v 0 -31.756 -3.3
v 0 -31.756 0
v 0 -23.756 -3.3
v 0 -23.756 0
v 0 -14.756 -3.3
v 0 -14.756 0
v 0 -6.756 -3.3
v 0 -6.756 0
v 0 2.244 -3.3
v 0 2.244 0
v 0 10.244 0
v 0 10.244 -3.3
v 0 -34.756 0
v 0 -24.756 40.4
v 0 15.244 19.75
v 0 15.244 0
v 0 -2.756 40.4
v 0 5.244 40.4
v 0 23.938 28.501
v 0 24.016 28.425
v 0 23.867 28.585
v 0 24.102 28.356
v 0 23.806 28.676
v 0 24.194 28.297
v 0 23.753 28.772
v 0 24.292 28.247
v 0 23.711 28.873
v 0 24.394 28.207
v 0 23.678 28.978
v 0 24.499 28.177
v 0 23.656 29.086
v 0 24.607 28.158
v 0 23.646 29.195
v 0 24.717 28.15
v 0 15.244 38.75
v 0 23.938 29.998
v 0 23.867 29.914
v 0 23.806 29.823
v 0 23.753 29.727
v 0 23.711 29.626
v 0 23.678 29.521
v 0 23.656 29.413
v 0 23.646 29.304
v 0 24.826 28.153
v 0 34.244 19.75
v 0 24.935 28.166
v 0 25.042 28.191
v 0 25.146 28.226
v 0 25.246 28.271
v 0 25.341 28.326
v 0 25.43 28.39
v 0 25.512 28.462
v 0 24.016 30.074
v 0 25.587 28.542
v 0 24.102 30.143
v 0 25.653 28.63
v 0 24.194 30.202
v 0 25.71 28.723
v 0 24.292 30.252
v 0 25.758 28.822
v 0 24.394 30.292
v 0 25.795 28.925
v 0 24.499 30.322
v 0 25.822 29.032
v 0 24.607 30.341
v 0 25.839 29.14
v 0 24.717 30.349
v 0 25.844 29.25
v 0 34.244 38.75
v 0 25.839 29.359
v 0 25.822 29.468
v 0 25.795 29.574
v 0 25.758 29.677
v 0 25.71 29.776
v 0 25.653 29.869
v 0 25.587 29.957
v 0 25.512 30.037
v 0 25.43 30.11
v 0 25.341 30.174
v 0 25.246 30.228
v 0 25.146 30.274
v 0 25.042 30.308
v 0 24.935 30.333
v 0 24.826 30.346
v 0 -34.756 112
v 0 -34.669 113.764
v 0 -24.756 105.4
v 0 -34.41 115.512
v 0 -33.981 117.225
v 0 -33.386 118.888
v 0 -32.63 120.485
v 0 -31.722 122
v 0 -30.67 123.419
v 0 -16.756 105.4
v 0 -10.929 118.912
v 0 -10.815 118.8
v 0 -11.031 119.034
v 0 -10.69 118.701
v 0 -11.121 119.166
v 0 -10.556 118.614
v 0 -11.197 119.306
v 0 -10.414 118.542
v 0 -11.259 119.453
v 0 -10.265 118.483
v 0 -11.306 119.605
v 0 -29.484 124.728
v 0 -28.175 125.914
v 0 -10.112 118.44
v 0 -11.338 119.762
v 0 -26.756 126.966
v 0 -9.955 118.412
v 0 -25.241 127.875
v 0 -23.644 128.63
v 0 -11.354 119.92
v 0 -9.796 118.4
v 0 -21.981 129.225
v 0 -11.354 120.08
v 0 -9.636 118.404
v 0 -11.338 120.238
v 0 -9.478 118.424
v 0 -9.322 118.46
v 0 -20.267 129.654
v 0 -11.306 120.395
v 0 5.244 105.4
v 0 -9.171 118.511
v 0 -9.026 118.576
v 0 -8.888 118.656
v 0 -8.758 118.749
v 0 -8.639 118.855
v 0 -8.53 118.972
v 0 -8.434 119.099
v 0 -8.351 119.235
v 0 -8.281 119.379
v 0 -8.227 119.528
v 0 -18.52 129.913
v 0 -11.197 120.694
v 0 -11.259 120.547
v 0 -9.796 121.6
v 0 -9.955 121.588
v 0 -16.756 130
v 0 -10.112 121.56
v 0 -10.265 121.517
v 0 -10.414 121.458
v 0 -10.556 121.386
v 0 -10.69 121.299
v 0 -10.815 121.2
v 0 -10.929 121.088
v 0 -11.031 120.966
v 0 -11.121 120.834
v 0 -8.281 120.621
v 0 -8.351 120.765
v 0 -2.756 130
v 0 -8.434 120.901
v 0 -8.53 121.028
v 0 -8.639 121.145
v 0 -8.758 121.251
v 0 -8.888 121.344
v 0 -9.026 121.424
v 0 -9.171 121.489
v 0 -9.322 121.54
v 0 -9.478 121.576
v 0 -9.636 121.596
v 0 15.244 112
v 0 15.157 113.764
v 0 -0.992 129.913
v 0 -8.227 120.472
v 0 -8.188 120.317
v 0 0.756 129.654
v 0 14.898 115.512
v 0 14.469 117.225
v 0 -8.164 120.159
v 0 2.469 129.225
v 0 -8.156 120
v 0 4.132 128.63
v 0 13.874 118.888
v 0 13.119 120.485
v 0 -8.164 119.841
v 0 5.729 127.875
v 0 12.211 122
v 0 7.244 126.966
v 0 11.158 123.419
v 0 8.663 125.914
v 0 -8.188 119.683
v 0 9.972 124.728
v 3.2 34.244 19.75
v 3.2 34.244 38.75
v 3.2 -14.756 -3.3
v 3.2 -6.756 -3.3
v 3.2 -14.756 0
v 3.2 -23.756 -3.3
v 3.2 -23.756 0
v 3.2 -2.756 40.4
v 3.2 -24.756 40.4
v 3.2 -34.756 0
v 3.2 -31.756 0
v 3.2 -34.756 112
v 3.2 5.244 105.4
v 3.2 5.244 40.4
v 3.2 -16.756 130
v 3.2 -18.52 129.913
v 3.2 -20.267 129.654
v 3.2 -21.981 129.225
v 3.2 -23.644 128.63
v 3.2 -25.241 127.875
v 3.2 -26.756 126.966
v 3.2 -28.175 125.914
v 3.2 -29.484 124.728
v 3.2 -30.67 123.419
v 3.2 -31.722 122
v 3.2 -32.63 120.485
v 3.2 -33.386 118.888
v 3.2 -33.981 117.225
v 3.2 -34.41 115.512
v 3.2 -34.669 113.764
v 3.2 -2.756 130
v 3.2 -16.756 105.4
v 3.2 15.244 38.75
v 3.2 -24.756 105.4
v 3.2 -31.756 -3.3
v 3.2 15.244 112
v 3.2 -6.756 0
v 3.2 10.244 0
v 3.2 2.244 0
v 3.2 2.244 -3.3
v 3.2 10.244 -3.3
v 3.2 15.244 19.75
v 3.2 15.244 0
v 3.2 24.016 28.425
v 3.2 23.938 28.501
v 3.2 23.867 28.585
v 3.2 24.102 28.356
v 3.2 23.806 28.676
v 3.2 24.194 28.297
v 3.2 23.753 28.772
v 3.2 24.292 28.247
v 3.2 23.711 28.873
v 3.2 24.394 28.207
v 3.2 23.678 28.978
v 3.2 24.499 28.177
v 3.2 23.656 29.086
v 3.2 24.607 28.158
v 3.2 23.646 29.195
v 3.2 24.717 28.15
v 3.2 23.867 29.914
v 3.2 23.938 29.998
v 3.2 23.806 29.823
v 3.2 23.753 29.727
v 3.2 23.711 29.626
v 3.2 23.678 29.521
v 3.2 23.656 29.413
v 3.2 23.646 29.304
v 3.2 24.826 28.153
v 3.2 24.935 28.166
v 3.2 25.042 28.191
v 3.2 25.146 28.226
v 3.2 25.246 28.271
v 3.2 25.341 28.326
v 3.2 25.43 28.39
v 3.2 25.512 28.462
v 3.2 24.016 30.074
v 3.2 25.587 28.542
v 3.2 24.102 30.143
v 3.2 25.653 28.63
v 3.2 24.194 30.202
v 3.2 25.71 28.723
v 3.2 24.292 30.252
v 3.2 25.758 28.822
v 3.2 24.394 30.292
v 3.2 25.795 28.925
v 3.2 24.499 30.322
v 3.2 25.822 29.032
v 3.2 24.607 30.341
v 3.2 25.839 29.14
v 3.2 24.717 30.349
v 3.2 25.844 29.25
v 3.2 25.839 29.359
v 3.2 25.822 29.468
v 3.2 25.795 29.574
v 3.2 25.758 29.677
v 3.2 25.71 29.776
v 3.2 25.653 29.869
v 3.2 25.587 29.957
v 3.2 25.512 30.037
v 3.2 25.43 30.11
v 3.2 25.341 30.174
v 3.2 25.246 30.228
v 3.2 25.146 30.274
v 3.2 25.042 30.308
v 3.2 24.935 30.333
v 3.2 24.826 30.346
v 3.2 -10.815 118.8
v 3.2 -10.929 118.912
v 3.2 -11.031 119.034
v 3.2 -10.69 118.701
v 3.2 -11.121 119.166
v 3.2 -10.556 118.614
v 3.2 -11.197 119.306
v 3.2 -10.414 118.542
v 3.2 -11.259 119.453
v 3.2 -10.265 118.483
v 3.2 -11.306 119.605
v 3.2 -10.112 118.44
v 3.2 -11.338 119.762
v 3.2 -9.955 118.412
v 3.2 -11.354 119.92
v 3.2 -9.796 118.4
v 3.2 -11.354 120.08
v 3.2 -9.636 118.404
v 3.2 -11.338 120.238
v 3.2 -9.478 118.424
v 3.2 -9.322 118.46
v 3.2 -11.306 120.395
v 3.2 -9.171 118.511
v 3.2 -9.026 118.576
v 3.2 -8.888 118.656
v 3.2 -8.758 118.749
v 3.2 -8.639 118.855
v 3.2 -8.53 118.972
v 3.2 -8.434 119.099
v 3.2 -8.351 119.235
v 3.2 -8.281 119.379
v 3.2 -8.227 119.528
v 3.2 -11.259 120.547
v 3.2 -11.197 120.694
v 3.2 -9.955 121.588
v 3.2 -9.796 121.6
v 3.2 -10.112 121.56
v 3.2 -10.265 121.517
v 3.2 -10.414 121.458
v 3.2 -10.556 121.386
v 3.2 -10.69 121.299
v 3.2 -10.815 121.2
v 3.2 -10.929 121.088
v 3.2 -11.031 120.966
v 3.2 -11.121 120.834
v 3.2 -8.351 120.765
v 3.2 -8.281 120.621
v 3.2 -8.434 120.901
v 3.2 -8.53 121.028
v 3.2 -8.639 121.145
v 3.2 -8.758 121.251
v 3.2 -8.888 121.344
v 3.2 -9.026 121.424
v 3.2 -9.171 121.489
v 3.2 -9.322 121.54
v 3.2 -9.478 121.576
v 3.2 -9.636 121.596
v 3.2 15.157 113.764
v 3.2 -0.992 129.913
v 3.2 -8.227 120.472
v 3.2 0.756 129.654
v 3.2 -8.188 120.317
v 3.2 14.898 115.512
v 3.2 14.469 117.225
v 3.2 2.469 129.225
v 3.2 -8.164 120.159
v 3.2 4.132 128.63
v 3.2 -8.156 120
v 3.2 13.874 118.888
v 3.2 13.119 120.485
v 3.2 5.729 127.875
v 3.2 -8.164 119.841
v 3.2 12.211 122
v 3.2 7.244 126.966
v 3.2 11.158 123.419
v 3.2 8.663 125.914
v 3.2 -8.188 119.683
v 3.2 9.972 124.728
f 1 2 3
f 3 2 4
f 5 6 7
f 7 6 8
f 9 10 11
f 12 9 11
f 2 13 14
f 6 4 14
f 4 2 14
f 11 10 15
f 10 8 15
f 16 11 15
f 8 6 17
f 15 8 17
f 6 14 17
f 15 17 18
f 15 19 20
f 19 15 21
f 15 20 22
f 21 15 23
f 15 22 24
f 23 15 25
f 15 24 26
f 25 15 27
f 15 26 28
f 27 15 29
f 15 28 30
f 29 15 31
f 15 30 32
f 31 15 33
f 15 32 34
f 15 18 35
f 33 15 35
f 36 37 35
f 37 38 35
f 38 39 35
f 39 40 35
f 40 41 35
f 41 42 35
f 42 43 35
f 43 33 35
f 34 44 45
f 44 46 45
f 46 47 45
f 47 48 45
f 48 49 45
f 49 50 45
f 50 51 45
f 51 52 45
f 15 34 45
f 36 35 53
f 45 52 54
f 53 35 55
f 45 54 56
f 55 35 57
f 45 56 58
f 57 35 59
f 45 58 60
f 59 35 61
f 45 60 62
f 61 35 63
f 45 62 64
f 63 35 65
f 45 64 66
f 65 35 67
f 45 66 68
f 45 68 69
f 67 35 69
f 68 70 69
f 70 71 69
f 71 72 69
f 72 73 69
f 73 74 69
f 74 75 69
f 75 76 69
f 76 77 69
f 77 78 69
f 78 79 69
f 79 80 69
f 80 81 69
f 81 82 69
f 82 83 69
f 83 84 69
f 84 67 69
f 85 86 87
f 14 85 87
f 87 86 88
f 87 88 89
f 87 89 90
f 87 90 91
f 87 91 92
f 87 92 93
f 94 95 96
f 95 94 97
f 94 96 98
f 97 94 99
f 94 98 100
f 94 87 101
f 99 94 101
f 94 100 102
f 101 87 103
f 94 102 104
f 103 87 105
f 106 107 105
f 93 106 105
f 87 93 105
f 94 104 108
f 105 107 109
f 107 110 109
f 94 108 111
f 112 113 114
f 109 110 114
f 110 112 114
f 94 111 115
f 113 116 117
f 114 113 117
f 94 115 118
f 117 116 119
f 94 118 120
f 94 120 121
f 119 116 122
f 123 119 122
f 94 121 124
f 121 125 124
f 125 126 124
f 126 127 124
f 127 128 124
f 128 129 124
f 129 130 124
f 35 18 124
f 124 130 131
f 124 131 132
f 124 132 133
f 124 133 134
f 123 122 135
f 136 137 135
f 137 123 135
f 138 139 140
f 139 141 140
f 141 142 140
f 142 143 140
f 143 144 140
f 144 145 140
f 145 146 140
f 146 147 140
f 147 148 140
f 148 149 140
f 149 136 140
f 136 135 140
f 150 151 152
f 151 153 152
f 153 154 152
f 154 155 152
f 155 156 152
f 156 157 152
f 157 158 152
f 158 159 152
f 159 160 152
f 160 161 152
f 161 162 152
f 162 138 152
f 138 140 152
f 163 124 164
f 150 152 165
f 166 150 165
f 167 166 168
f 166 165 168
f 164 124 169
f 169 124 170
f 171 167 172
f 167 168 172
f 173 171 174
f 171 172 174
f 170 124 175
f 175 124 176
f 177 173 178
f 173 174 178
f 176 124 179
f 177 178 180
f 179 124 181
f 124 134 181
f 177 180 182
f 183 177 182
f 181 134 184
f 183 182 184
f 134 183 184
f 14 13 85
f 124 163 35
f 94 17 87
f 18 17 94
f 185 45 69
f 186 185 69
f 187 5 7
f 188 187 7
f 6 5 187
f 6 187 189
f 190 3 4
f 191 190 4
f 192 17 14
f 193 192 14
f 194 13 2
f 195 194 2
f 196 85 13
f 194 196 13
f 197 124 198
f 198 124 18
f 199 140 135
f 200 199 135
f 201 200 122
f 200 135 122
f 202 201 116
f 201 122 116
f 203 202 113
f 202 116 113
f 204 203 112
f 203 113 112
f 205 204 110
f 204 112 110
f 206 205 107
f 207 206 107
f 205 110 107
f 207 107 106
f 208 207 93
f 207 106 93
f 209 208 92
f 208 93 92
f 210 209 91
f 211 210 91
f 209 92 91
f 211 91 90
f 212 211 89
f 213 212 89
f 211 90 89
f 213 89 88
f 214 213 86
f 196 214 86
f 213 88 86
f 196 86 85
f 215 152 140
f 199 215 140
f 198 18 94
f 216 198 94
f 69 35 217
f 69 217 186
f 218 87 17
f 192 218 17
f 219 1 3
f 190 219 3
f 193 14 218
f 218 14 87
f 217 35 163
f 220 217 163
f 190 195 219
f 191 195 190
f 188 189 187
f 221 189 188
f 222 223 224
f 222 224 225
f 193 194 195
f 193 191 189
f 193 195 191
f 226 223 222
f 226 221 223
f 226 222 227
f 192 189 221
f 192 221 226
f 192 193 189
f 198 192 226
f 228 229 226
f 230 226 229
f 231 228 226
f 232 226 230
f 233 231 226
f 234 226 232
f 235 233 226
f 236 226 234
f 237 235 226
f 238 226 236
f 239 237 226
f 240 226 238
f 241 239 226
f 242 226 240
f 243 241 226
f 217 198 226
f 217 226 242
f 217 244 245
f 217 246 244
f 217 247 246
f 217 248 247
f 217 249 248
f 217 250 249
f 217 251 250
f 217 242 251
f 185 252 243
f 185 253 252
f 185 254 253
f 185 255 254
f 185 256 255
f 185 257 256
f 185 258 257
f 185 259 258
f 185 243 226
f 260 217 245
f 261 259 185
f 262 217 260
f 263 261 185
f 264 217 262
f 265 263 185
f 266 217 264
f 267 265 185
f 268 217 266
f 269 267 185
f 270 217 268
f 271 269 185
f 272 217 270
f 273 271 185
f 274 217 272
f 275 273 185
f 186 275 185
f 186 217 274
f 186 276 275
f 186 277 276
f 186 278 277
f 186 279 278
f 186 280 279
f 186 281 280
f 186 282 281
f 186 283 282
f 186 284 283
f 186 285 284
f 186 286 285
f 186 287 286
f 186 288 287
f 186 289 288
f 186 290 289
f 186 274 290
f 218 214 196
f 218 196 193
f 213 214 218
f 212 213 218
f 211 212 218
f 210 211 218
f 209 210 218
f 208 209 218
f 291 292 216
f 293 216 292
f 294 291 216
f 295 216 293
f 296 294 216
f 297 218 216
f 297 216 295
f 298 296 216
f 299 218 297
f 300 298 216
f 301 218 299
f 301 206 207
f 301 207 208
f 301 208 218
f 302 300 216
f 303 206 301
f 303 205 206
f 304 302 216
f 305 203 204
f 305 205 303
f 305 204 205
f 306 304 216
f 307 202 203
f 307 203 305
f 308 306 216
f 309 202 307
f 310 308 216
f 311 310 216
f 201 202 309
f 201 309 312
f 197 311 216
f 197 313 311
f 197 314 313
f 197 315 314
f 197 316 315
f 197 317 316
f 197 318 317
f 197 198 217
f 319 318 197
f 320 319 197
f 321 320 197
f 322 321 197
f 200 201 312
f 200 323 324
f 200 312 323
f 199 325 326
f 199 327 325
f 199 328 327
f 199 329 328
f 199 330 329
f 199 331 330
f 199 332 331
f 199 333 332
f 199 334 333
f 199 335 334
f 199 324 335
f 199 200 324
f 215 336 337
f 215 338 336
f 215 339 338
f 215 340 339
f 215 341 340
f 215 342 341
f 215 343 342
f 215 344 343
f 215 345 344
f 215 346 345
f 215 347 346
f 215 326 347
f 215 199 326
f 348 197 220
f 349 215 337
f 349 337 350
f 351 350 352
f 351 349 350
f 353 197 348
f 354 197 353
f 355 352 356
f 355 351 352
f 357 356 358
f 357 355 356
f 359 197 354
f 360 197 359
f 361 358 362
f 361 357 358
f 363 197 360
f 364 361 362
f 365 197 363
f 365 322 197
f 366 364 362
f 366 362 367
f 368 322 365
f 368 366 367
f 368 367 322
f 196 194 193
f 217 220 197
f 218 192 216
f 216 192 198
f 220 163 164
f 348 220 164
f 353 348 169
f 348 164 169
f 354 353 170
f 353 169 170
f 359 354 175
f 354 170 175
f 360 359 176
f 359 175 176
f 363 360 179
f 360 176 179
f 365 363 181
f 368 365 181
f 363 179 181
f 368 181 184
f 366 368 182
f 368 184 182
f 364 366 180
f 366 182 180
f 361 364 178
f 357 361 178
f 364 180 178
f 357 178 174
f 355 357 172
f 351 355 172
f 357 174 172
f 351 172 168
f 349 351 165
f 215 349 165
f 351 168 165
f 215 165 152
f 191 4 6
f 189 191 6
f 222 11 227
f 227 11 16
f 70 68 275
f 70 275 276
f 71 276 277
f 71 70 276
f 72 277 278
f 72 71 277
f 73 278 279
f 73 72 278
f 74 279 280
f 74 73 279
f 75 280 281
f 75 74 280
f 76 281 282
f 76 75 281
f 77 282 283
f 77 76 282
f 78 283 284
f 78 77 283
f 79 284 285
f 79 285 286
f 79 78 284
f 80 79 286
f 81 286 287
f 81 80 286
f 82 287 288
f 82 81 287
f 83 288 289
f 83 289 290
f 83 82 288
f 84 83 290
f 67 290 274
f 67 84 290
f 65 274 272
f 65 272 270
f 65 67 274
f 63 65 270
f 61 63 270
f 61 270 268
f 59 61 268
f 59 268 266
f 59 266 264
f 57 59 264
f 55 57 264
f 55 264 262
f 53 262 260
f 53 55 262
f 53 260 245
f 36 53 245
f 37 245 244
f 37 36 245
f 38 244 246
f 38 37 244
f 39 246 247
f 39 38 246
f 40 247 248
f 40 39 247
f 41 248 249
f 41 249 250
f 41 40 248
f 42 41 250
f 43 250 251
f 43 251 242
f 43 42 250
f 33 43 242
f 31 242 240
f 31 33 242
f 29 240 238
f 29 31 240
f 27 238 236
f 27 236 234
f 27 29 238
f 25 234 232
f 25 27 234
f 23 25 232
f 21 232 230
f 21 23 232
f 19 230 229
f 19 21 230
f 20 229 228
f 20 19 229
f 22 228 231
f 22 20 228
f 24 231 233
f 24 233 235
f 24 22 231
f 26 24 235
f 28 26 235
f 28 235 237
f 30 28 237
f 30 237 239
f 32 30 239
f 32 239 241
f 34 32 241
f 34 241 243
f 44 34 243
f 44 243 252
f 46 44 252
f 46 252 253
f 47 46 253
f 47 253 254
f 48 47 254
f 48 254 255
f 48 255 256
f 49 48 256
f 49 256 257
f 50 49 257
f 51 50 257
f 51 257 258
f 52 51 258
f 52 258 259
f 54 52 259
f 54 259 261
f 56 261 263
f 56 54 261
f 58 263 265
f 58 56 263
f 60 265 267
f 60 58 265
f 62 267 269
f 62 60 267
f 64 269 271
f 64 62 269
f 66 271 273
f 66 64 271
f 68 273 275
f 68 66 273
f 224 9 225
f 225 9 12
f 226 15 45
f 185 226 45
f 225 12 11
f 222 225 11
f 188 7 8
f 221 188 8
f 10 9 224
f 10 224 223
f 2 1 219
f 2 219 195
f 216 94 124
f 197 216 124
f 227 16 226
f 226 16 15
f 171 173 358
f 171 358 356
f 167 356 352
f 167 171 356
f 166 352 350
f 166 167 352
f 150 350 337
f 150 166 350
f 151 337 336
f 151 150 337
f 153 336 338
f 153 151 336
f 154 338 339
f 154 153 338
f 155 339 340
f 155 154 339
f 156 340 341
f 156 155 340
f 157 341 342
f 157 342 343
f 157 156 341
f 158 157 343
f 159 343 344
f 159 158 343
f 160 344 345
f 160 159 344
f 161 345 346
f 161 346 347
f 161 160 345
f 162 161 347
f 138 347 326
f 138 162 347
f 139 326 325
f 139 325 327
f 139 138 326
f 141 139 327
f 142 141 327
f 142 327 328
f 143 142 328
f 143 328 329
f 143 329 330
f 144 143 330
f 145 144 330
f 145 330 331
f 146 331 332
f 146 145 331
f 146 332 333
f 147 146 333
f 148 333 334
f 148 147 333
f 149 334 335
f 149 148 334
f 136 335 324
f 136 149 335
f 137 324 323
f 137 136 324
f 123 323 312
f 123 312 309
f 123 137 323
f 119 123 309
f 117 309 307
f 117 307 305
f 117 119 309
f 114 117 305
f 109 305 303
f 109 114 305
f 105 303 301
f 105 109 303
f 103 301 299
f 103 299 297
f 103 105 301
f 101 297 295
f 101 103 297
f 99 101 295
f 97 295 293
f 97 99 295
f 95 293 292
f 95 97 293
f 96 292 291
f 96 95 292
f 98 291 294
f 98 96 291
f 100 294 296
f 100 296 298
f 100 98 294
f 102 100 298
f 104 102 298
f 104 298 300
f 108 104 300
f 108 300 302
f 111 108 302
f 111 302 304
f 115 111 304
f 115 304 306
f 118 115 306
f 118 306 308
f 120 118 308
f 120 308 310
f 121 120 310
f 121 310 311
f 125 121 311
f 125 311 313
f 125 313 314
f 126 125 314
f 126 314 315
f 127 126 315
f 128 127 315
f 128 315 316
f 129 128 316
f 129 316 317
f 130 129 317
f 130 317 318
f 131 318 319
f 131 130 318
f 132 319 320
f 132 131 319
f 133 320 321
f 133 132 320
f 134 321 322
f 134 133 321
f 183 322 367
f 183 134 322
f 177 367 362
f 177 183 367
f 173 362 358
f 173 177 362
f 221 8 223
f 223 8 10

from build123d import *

# Parameters (mm, degrees)
F0_R     = 1.6
F0_W     = 8
F0_H     = 3.3
F0_W_2   = 19
F0_H_2   = 19
F0_R_2   = 1.1
F1_DEPTH = 3.2


# Not quite as in the source:
# - a feature names something its author has since deleted; it is built from what else it names


with BuildPart() as f1:
    # F0 (on Right) → F1 (new body)
    with BuildSketch(Plane.YZ):
        with BuildLine():
            ThreePointArc((-16.7558317706, 130), (-29.483753832, 124.7279220614), (-34.7558317706, 112))
            Line((-34.7558317706, 112), (-34.7558317706, 0))
            Line((-34.7558317706, 0), (-31.7558317706, 0))
            Line((-31.7558317706, 0), (-23.7558317706, 0))
            Line((-23.7558317706, 0), (-14.7558317706, 0))
            Line((-14.7558317706, 0), (-6.7558317706, 0))
            Line((-6.7558317706, 0), (2.2441682294, 0))
            Line((2.2441682294, 0), (10.2441682294, 0))
            Line((10.2441682294, 0), (15.2441682294, 0))
            Line((15.2441682294, 0), (15.2441682294, 19.74954395))
            Line((15.2441682294, 19.74954395), (15.2441682294, 38.74954395))
            Line((15.2441682294, 38.74954395), (15.2441682294, 112))
            ThreePointArc((15.2441682294, 112), (9.9720902908, 124.7279220614), (-2.7558317706, 130))
            Line((-2.7558317706, 130), (-16.7558317706, 130))
        make_face()
        Polygon((-24.7558317706, 40.4), (-24.7558317706, 105.4), (-16.7558317706, 105.4), (5.2441682294, 105.4), (5.2441682294, 40.4), (-2.7558317706, 40.4), align=None, mode=Mode.SUBTRACT)
        with Locations((-9.7558317706, 120)):
            Circle(F0_R, mode=Mode.SUBTRACT)
        with Locations((-27.7558317706, -1.65)):
            Rectangle(F0_W, F0_H)
        with Locations((-10.7558317706, -1.65)):
            Rectangle(F0_W, F0_H)
        with Locations((24.7441682294, 29.24954395)):
            Rectangle(F0_W_2, F0_H_2)
        with Locations((24.7441682294, 29.24954395)):
            Circle(F0_R_2, mode=Mode.SUBTRACT)
        with Locations((6.2441682294, -1.65)):
            Rectangle(F0_W, F0_H)
        Polygon((-16.7558317706, 105.4), (-24.7558317706, 105.4), (-2.7558317706, 40.4), (5.2441682294, 40.4), align=None)
    extrude(amount=F1_DEPTH)


solid = f1.part
